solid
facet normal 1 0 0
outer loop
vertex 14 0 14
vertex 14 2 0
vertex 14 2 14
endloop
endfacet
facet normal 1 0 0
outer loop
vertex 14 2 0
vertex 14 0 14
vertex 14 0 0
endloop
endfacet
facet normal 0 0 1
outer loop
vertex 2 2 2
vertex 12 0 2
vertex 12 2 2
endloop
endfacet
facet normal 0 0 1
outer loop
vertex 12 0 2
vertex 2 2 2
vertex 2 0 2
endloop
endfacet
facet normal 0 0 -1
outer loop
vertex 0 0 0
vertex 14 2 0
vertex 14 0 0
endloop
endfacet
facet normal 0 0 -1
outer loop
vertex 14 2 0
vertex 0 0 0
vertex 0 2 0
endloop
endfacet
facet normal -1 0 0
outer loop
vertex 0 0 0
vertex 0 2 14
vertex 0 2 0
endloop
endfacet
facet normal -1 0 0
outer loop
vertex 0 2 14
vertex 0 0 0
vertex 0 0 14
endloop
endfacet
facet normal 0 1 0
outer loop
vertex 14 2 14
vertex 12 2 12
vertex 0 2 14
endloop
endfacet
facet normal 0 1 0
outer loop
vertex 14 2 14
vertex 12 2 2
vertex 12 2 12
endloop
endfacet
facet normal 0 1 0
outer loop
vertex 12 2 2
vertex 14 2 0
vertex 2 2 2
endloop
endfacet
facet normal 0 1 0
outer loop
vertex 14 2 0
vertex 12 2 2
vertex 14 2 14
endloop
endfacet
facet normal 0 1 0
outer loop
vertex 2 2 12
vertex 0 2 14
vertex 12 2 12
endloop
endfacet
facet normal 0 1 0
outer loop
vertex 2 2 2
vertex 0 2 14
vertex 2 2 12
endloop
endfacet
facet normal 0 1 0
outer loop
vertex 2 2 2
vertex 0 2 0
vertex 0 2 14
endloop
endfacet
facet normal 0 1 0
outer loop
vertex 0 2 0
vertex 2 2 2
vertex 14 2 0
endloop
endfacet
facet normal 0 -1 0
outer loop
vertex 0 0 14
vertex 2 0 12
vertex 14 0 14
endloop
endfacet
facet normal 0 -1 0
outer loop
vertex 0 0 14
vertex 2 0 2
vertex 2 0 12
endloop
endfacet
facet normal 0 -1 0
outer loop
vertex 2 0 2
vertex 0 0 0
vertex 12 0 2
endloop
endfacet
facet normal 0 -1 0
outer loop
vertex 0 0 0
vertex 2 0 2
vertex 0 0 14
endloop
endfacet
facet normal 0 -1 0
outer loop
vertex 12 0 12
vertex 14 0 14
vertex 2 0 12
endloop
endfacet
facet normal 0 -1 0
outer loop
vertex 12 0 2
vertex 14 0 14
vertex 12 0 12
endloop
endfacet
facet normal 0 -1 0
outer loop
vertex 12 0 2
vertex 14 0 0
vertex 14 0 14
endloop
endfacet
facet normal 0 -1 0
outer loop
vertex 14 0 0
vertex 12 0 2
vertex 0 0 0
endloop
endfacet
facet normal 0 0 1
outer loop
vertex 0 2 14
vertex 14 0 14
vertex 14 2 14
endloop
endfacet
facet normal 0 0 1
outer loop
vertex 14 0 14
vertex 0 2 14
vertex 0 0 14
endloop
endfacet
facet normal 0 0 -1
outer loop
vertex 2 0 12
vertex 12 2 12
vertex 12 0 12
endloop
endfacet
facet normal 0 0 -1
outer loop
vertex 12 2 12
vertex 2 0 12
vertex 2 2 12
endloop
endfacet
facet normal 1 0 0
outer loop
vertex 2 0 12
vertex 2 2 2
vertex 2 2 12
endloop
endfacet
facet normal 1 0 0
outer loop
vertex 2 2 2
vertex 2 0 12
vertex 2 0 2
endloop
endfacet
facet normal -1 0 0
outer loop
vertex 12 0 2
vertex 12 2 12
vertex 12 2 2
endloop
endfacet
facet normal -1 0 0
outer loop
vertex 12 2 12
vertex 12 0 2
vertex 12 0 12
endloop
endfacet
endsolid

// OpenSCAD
// U-shaped spring clip.
$fn = 60;
eps = 0.02;
clip_w = 14;
clip_h = 14;
clip_t = 2;
union() { cube([clip_w,clip_t,clip_t]); translate([0,0,clip_h-clip_t]) cube([clip_w,clip_t,clip_t]); cube([clip_t,clip_t,clip_h]); translate([clip_w-clip_t,0,0]) cube([clip_t,clip_t,clip_h]); }
